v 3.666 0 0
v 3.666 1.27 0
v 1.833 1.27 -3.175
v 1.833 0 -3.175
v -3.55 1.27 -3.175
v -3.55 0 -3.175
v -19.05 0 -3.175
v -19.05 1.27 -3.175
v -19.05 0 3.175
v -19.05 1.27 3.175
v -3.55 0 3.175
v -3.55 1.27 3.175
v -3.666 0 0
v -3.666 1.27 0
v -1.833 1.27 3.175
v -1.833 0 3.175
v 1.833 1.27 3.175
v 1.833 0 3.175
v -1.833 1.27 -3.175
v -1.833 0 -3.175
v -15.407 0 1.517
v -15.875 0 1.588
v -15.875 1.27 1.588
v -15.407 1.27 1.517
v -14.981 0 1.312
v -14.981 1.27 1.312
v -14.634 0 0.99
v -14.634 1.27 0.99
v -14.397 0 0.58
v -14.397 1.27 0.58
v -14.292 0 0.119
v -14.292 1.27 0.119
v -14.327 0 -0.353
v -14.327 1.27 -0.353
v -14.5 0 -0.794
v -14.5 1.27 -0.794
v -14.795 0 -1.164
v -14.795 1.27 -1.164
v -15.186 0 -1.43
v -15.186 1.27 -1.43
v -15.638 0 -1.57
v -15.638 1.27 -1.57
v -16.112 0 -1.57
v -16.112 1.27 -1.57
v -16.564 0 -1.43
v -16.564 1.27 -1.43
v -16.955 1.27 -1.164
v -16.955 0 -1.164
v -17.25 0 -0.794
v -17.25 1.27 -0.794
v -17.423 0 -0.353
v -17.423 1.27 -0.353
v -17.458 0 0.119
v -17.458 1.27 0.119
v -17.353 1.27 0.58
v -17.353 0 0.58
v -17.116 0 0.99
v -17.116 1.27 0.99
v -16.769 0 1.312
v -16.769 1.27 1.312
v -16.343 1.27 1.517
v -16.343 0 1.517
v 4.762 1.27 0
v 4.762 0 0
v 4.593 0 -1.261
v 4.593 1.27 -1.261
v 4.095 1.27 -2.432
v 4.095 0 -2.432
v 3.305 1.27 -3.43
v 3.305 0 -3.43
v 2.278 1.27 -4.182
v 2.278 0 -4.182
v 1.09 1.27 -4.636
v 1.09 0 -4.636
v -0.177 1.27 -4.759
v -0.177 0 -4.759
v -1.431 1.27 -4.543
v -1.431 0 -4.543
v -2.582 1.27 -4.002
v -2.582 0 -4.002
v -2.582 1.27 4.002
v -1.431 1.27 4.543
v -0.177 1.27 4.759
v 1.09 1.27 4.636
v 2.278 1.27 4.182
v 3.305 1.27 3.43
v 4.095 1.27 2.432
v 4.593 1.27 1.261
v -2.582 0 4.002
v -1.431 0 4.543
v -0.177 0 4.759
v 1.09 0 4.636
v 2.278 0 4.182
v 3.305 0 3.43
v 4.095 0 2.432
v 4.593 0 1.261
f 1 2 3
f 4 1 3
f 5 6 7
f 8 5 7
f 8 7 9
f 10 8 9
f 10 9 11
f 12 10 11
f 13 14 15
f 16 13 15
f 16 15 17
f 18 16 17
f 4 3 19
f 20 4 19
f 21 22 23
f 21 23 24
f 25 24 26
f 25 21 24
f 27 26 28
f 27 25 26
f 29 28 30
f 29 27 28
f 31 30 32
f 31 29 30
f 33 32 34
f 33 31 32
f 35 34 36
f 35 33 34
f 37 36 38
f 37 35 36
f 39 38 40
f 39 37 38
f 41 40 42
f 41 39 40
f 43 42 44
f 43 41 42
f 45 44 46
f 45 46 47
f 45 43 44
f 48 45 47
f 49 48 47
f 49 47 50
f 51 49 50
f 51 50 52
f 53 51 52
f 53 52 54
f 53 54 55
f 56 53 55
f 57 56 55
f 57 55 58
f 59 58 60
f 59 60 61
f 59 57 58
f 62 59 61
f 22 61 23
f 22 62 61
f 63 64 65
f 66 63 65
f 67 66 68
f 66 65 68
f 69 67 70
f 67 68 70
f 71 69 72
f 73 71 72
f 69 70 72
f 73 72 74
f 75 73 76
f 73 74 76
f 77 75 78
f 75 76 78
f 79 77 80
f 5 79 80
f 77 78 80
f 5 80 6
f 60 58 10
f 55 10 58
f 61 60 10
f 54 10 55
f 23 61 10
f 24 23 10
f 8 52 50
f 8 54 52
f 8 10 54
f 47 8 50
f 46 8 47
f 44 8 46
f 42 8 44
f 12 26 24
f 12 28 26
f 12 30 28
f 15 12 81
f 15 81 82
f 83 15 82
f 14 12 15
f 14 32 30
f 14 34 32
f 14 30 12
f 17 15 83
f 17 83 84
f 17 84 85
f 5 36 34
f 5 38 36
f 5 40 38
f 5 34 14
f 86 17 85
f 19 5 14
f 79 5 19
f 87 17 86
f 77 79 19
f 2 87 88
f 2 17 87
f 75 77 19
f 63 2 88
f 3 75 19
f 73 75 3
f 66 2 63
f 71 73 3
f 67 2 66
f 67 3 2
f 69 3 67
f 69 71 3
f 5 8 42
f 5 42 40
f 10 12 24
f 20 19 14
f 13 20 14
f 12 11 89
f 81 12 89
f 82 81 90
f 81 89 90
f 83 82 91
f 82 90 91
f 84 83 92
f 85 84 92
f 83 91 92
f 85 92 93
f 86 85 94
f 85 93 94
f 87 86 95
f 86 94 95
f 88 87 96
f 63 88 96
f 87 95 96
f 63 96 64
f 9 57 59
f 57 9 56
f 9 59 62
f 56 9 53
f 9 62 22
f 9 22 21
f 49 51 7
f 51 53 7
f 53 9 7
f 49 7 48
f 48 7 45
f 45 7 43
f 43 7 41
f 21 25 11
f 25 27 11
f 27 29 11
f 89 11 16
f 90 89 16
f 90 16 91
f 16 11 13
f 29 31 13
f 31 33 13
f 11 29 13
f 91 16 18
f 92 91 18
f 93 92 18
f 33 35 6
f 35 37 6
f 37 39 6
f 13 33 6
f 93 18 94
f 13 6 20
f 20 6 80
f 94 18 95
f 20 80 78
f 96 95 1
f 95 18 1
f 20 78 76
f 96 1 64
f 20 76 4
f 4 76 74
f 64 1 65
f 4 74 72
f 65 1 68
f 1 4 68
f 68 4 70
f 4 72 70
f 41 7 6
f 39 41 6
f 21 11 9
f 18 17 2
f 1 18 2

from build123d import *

# Parameters (mm, degrees)
SKETCH1_R           = 1.5875
BOSS_EXTRUDE1_DEPTH = 1.27
CUT_EXTRUDE1_DEPTH  = 2.54


with BuildPart() as part:
    # Sketch1 → Boss-Extrude1 (new body)
    with BuildSketch(Plane(origin=(0, 0, 0), x_dir=(1, 0, 0), z_dir=(0, 1, 0))):
        with BuildLine():
            Line((-3.549757914, 3.175), (-19.05, 3.175))
            Line((-19.05, 3.175), (-19.05, -3.175))
            Line((-19.05, -3.175), (-3.549757914, -3.175))
            ThreePointArc((-3.549757914, -3.175), (4.7625, 0), (-3.549757914, 3.175))
        make_face()
        with Locations((-15.875, 0)):
            Circle(SKETCH1_R, mode=Mode.SUBTRACT)
    extrude(amount=BOSS_EXTRUDE1_DEPTH)

    # Sketch2 → Cut-Extrude1 (cut)
    with BuildSketch(Plane(origin=(0, 1.27, 0), x_dir=(1, 0, 0), z_dir=(0, 1, 0))):
        Polygon((3.666174209, 0), (1.833087105, 3.175), (-1.833087105, 3.175), (-3.666174209, 0), (-1.833087105, -3.175), (1.833087105, -3.175), align=None)
    extrude(amount=-CUT_EXTRUDE1_DEPTH, mode=Mode.SUBTRACT)


solid = part.part
